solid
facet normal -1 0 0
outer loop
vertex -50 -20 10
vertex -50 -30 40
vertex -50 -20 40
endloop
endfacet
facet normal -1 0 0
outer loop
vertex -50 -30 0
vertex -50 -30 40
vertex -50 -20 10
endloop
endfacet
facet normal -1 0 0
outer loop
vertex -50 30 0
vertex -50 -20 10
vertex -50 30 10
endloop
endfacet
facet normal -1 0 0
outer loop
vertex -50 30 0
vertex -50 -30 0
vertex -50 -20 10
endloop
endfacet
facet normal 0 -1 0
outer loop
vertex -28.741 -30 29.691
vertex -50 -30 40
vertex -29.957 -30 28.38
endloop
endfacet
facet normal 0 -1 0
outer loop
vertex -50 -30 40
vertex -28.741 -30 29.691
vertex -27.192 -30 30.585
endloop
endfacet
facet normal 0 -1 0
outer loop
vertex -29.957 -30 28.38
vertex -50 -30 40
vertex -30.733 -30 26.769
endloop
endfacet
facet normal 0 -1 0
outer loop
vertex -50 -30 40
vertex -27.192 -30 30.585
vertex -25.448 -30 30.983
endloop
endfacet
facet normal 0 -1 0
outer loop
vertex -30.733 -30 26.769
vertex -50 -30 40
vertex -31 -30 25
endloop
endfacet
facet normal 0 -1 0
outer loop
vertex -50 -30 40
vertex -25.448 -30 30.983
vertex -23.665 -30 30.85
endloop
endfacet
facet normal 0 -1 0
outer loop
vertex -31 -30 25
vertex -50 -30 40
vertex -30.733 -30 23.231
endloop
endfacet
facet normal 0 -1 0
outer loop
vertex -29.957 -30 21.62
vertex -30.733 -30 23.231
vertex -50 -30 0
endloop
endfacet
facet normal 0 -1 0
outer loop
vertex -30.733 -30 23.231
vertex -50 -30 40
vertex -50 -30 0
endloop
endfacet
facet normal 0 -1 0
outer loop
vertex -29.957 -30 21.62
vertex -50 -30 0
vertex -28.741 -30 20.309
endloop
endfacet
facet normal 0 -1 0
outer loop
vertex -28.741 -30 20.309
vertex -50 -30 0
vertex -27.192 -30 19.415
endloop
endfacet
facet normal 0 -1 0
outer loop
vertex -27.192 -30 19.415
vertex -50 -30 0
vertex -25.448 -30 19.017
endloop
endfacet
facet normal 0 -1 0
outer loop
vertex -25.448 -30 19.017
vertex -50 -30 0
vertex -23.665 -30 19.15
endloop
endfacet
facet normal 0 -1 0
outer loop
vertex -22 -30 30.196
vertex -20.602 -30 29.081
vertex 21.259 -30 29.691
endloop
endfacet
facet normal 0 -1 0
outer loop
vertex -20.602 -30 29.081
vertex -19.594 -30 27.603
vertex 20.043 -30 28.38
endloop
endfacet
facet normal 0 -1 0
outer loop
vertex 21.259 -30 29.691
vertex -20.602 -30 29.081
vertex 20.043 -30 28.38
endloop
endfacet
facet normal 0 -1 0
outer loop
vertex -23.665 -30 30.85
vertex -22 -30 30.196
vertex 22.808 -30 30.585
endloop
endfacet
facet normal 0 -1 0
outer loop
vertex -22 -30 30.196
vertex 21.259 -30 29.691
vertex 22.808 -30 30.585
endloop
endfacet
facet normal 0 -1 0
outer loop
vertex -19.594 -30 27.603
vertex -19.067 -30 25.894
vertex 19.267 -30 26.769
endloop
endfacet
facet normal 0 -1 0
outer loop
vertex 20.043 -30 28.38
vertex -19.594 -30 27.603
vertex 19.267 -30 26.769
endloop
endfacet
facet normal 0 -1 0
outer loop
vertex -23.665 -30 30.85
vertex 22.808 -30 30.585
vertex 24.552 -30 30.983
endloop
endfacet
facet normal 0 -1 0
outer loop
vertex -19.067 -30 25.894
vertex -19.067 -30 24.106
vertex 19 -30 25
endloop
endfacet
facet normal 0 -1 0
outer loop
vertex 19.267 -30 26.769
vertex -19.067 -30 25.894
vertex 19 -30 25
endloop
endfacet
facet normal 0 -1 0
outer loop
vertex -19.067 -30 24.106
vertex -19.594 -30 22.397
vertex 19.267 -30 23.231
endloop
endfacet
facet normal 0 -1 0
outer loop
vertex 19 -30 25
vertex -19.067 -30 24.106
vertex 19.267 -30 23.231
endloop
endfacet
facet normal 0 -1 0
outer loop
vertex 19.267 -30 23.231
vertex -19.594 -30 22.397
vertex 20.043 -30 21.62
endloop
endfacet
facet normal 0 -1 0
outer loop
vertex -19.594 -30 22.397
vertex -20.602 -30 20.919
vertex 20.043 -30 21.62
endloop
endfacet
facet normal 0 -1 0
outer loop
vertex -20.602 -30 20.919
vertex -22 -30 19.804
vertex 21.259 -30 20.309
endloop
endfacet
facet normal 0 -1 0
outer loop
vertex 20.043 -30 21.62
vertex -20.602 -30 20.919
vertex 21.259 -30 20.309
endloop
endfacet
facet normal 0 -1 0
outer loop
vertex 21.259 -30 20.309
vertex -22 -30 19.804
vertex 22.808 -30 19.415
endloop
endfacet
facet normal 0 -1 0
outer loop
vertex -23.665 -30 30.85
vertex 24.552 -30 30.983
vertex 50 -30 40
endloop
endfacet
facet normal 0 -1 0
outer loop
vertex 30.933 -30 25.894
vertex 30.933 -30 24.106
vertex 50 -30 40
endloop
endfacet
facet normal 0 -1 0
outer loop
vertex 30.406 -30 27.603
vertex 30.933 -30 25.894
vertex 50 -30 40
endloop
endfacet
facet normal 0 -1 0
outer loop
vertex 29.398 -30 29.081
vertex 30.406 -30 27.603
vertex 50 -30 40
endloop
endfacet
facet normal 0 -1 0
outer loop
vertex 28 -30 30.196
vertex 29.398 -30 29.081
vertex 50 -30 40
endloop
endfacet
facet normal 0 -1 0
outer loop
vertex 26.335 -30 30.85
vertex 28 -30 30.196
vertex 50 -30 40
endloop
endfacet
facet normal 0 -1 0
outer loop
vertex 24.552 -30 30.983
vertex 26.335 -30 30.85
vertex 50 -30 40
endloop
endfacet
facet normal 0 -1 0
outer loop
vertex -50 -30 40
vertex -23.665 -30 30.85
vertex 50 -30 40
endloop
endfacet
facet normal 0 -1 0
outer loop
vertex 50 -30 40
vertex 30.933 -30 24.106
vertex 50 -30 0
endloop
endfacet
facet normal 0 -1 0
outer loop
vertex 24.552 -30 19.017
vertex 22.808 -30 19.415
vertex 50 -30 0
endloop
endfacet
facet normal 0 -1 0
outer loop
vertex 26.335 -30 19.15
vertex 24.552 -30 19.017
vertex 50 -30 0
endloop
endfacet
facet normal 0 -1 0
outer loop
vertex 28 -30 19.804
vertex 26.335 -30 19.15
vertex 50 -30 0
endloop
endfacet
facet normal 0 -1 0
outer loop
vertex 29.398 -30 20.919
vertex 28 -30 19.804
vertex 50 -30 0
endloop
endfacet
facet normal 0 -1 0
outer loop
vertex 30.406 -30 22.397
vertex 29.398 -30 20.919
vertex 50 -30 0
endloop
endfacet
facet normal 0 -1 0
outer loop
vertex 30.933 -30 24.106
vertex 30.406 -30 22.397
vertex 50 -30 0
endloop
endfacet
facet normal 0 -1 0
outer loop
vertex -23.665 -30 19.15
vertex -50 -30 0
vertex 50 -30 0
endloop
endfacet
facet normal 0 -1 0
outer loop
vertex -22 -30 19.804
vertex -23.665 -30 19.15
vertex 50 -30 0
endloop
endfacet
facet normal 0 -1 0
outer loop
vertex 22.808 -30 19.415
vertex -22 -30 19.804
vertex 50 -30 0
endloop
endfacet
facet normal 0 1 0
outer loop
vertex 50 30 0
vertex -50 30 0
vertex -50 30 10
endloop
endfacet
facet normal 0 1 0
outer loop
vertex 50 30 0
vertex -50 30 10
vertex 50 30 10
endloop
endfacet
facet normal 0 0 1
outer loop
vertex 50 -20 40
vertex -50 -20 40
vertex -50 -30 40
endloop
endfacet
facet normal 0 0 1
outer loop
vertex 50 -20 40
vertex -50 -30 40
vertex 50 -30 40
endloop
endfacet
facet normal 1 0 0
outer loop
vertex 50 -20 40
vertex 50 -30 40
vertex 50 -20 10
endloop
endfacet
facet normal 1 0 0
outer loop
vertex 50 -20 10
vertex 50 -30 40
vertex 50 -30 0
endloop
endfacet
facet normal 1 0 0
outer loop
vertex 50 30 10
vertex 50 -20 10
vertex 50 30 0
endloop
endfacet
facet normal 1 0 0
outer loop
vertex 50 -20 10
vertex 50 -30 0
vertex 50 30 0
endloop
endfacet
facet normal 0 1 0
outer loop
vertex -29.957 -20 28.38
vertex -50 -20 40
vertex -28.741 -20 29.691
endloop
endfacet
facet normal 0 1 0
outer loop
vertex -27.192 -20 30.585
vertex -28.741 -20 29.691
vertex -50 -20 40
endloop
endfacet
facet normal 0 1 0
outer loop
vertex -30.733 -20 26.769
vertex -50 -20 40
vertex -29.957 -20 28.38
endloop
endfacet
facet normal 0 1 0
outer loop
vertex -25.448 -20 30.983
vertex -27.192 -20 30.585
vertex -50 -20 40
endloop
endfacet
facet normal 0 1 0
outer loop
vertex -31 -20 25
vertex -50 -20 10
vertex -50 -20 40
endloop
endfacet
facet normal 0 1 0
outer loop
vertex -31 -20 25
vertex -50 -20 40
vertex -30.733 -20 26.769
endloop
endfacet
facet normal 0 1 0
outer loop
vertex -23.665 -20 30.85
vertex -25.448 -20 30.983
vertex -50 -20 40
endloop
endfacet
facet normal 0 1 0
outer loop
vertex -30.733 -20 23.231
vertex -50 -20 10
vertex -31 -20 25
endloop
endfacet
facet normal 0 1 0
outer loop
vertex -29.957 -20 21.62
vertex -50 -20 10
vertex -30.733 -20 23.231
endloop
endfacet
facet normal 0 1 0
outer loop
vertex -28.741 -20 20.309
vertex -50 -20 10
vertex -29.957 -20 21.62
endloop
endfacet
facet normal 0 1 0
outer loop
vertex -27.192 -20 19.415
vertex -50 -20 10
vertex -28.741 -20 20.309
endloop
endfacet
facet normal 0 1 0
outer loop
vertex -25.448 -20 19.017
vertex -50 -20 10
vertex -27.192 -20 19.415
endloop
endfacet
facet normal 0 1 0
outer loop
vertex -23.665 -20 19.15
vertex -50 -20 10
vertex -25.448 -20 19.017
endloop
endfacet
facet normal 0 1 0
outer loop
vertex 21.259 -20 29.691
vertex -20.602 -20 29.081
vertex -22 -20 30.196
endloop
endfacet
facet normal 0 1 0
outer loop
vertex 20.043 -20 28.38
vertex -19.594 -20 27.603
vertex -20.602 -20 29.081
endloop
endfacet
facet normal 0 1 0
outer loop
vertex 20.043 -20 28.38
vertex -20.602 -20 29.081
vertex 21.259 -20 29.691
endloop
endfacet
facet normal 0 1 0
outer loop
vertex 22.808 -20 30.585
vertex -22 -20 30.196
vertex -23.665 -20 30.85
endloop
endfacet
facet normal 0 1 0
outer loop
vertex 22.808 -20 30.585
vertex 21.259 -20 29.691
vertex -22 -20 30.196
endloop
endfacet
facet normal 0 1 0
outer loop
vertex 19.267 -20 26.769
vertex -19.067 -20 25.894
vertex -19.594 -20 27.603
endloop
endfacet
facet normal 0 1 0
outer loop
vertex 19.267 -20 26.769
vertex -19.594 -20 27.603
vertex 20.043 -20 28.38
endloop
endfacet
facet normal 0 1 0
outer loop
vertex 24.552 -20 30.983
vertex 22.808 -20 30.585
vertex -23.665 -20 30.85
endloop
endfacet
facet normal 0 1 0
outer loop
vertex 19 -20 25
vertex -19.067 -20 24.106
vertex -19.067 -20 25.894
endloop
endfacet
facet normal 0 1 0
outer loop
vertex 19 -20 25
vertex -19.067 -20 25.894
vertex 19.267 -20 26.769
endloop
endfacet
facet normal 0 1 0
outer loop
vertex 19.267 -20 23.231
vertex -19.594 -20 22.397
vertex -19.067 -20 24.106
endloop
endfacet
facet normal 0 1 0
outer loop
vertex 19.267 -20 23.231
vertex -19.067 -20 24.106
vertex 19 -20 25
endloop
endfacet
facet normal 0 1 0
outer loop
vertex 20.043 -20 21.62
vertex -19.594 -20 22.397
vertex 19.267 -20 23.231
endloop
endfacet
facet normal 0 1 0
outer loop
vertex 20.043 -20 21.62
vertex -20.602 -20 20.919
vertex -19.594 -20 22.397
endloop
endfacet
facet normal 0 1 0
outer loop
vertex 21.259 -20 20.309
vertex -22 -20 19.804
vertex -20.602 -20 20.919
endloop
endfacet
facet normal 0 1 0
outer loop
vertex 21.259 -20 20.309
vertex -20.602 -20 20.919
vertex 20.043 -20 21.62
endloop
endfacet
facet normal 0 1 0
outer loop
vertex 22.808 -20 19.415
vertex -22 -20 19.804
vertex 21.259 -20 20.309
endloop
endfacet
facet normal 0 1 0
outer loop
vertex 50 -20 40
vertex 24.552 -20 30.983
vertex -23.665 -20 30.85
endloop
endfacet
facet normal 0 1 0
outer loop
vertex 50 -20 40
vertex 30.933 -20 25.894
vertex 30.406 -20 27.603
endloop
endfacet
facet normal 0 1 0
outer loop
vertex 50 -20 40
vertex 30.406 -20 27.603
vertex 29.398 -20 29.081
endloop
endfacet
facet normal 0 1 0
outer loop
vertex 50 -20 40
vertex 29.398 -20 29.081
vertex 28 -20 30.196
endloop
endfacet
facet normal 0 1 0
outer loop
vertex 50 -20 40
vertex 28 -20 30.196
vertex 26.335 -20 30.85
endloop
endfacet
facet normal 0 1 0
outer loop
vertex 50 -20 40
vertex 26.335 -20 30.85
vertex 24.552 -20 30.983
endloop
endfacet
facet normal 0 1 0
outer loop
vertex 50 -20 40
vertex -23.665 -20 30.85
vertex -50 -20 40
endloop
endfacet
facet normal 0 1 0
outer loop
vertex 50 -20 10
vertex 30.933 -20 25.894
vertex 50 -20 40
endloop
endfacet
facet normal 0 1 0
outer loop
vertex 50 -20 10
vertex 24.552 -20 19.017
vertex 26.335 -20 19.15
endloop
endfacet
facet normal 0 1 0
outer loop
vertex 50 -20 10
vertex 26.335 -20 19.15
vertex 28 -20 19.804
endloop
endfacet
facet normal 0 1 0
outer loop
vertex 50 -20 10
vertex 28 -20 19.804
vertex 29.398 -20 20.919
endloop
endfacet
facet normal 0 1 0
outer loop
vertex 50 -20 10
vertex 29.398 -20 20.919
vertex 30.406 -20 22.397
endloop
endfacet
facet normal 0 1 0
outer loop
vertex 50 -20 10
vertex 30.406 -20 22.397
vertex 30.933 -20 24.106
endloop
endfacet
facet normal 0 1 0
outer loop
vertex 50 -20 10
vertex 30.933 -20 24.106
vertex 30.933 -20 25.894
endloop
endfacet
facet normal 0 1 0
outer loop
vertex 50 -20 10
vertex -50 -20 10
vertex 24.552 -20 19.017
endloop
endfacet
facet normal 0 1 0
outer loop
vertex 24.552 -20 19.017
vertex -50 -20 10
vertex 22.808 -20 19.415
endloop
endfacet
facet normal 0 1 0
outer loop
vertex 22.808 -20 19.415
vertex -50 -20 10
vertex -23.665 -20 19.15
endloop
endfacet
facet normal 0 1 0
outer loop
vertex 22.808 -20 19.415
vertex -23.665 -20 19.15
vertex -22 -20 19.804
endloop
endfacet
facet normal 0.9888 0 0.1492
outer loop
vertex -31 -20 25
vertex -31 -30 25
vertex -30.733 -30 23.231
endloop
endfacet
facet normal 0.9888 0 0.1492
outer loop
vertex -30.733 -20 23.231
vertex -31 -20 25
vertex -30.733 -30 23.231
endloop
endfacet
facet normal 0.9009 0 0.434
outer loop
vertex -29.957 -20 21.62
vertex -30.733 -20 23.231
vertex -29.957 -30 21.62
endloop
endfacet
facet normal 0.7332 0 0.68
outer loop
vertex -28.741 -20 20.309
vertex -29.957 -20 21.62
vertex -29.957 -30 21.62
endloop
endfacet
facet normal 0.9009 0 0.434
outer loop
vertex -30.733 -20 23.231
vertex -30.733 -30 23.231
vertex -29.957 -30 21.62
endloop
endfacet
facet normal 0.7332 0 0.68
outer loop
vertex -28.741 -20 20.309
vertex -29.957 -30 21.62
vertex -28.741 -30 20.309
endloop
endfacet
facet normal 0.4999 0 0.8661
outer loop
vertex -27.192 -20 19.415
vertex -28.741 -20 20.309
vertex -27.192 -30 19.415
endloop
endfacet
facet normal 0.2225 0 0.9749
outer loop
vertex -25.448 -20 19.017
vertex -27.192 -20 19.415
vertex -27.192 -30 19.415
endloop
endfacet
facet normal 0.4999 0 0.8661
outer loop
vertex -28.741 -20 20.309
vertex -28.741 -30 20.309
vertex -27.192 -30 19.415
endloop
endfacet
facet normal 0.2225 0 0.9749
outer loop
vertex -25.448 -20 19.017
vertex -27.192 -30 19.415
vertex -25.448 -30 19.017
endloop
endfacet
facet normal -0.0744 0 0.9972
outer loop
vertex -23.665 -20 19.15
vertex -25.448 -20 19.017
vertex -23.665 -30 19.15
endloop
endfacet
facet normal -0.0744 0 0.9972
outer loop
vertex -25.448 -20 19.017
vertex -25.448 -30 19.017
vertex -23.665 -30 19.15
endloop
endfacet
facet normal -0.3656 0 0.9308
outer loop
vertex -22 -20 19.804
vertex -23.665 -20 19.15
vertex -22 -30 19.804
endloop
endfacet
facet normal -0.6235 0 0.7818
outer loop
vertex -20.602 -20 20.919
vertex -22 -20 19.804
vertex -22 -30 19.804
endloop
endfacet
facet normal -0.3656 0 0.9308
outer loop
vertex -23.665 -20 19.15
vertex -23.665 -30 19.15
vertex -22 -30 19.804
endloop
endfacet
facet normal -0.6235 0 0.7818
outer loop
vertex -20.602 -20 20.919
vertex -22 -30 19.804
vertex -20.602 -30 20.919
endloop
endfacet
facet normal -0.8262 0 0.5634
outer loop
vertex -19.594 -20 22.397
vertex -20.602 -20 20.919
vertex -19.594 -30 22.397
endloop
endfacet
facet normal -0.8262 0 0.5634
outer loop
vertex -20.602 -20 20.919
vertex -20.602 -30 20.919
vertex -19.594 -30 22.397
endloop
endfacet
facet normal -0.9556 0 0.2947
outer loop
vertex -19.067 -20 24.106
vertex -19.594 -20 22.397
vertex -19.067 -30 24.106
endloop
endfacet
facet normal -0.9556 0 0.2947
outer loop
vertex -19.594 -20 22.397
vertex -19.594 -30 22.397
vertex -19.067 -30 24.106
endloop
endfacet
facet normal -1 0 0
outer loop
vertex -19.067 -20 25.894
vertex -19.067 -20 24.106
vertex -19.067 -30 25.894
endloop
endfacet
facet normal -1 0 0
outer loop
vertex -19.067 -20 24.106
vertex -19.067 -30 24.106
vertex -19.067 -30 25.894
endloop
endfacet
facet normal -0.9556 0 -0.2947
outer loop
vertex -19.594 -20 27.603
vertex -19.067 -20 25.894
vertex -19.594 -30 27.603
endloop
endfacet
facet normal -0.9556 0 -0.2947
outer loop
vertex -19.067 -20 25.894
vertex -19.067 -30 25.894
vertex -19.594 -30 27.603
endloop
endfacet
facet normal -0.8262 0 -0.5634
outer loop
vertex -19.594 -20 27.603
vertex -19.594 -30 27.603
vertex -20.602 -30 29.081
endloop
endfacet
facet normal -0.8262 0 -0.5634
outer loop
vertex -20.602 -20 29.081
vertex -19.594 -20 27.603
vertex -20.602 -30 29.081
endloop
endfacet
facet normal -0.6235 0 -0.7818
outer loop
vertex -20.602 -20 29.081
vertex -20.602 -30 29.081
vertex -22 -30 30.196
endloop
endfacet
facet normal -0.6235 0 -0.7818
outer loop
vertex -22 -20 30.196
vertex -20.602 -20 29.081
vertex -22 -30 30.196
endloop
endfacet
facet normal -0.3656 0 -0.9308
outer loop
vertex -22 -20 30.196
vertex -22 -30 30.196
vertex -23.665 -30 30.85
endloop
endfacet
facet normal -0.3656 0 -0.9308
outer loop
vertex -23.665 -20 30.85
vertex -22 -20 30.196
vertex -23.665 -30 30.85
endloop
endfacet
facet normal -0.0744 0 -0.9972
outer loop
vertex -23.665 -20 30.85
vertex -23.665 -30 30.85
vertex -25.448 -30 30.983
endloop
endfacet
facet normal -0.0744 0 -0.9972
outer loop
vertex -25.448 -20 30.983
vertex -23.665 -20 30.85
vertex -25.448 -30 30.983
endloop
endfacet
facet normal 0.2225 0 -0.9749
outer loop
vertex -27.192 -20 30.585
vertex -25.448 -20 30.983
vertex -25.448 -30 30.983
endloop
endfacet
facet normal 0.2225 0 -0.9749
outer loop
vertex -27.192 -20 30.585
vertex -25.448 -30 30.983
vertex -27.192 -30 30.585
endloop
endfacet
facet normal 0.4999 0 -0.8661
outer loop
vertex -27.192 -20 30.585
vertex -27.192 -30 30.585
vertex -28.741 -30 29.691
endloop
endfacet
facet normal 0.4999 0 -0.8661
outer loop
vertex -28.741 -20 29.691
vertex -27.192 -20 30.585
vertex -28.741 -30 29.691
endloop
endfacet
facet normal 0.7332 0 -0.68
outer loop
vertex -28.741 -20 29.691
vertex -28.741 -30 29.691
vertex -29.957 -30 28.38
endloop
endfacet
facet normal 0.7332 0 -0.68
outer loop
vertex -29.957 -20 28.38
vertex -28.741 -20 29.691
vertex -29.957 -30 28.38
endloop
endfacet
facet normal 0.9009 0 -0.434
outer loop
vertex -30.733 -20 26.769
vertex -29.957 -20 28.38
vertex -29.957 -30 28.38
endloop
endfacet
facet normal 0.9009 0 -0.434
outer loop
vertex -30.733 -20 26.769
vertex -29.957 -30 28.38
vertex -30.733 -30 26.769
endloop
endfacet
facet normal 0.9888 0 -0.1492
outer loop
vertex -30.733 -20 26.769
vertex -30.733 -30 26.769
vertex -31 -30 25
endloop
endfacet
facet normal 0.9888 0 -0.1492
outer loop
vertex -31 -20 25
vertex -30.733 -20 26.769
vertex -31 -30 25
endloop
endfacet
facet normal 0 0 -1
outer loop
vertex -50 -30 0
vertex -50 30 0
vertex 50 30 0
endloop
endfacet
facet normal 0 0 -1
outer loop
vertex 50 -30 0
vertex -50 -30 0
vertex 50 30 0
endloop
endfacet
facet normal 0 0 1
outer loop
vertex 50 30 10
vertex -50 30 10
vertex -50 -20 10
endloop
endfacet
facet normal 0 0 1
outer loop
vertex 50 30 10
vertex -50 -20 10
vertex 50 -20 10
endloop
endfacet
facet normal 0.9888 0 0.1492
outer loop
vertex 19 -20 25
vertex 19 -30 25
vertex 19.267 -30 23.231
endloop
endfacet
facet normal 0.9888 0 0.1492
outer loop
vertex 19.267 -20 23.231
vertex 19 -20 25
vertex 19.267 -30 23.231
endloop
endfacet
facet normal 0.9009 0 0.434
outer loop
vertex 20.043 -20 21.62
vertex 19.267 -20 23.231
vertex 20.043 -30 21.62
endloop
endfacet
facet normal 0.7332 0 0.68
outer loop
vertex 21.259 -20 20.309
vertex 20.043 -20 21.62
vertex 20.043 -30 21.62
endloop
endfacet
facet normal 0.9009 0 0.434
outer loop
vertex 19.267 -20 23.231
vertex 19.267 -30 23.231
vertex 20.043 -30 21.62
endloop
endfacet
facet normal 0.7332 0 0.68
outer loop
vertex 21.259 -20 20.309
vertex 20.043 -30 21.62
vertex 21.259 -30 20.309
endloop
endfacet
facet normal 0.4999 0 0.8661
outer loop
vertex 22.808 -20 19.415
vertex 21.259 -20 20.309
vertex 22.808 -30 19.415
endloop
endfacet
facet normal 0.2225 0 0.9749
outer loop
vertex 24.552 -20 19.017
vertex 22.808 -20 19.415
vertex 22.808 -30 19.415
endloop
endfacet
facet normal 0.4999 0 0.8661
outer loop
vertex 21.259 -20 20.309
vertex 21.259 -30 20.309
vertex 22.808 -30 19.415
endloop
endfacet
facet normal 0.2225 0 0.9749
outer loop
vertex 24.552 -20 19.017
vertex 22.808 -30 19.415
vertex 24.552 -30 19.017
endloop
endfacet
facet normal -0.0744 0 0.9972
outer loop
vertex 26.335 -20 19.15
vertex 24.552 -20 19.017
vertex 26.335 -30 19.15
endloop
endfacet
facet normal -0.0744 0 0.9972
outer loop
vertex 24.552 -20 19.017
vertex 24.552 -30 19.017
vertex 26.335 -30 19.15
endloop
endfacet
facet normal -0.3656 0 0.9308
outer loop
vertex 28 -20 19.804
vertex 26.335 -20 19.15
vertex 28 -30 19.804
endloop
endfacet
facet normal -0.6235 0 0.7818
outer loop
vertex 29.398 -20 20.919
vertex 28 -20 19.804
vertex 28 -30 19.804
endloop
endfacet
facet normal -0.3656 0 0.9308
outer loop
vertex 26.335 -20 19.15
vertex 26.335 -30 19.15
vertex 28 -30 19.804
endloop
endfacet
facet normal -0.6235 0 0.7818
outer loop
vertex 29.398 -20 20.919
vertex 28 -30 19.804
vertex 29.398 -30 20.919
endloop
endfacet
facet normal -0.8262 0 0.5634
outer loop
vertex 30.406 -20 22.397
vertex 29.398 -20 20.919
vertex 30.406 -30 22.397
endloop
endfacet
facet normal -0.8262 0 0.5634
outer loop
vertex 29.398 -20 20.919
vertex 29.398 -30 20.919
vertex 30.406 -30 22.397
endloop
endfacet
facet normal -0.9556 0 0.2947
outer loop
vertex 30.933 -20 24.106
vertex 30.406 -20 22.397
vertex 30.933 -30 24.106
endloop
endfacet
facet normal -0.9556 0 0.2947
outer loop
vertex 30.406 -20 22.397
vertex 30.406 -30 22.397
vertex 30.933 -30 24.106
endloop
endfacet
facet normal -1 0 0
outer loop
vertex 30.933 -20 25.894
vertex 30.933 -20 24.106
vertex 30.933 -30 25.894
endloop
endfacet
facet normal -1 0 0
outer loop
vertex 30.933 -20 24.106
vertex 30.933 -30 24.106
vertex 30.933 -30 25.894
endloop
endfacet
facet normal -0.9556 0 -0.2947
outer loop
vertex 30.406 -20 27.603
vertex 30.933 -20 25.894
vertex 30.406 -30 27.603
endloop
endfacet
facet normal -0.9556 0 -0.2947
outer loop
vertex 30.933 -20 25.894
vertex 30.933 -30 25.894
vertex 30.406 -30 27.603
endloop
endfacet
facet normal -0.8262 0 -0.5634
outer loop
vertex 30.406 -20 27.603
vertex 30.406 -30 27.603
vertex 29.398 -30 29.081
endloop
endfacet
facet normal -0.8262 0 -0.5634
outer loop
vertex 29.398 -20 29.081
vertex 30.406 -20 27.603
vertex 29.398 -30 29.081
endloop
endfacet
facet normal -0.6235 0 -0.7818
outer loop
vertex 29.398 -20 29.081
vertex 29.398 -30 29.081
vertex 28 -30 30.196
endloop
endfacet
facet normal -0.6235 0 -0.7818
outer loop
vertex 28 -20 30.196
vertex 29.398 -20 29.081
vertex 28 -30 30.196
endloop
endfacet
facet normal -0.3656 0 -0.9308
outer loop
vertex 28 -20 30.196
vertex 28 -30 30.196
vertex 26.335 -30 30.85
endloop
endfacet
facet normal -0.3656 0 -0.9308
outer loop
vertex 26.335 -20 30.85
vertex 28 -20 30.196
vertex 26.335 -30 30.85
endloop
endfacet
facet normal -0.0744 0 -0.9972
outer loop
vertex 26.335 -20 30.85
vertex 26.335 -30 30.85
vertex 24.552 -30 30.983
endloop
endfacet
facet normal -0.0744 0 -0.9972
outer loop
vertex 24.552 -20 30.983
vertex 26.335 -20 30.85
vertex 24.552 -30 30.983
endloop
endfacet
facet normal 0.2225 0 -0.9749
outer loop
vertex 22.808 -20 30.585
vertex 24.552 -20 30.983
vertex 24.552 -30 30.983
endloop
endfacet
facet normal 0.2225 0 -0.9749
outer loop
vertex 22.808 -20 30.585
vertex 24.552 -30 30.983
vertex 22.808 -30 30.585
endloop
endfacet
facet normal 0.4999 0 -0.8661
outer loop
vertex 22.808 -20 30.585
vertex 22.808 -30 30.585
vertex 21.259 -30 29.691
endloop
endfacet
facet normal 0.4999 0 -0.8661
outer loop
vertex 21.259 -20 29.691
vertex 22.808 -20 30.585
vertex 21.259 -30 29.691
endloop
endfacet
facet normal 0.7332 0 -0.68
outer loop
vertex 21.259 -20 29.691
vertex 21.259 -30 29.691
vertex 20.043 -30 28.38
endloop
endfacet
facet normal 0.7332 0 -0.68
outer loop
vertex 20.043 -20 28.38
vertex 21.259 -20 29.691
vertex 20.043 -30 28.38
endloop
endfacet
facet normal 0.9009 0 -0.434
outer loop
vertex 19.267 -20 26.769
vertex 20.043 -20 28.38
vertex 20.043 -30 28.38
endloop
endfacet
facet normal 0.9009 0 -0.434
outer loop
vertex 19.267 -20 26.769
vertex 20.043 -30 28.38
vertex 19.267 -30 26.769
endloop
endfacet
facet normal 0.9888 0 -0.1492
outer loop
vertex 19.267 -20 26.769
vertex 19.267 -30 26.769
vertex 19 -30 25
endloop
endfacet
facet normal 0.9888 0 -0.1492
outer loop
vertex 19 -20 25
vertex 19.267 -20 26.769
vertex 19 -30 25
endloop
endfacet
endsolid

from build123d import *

# Parameters (mm, degrees)
SZKIC1_W                    = 100
SZKIC1_H                    = 60
DODANIE_WYCI_GNI_CIE1_DEPTH = 10
SZKIC2_W                    = 100
SZKIC2_H                    = 10
DODANIE_WYCI_GNI_CIE2_DEPTH = 30
OTW_R_POD_RUB_M101_D        = 12
SZYK_LINIOWY2_COUNT         = 2
SZYK_LINIOWY2_PITCH         = 50


with BuildPart() as part:
    # Szkic1 → Dodanie-wyciągnięcie1 (new body)
    with BuildSketch(Plane.XY):
        Rectangle(SZKIC1_W, SZKIC1_H)
    extrude(amount=DODANIE_WYCI_GNI_CIE1_DEPTH)

    # Szkic2 → Dodanie-wyciągnięcie2 (add)
    with BuildSketch(Plane.XY.offset(10)):
        with Locations((0, -25)):
            Rectangle(SZKIC2_W, SZKIC2_H)
    extrude(amount=DODANIE_WYCI_GNI_CIE2_DEPTH)

    # Otwór pod śrubę M101 (through all)
    with Locations(Plane(origin=(0, -20, 0), x_dir=(1, 0, 0), z_dir=(0, 1, 0))):
        with Locations((-25, -25)):
            otw_r_pod_rub_m101 = Hole(OTW_R_POD_RUB_M101_D / 2)

    # Szyk liniowy2: Otwór pod śrubę M101 ×2
    with Locations(*[(i * SZYK_LINIOWY2_PITCH, 0, 0) for i in range(1, SZYK_LINIOWY2_COUNT)]):
        add(otw_r_pod_rub_m101, mode=Mode.SUBTRACT)


solid = part.part
